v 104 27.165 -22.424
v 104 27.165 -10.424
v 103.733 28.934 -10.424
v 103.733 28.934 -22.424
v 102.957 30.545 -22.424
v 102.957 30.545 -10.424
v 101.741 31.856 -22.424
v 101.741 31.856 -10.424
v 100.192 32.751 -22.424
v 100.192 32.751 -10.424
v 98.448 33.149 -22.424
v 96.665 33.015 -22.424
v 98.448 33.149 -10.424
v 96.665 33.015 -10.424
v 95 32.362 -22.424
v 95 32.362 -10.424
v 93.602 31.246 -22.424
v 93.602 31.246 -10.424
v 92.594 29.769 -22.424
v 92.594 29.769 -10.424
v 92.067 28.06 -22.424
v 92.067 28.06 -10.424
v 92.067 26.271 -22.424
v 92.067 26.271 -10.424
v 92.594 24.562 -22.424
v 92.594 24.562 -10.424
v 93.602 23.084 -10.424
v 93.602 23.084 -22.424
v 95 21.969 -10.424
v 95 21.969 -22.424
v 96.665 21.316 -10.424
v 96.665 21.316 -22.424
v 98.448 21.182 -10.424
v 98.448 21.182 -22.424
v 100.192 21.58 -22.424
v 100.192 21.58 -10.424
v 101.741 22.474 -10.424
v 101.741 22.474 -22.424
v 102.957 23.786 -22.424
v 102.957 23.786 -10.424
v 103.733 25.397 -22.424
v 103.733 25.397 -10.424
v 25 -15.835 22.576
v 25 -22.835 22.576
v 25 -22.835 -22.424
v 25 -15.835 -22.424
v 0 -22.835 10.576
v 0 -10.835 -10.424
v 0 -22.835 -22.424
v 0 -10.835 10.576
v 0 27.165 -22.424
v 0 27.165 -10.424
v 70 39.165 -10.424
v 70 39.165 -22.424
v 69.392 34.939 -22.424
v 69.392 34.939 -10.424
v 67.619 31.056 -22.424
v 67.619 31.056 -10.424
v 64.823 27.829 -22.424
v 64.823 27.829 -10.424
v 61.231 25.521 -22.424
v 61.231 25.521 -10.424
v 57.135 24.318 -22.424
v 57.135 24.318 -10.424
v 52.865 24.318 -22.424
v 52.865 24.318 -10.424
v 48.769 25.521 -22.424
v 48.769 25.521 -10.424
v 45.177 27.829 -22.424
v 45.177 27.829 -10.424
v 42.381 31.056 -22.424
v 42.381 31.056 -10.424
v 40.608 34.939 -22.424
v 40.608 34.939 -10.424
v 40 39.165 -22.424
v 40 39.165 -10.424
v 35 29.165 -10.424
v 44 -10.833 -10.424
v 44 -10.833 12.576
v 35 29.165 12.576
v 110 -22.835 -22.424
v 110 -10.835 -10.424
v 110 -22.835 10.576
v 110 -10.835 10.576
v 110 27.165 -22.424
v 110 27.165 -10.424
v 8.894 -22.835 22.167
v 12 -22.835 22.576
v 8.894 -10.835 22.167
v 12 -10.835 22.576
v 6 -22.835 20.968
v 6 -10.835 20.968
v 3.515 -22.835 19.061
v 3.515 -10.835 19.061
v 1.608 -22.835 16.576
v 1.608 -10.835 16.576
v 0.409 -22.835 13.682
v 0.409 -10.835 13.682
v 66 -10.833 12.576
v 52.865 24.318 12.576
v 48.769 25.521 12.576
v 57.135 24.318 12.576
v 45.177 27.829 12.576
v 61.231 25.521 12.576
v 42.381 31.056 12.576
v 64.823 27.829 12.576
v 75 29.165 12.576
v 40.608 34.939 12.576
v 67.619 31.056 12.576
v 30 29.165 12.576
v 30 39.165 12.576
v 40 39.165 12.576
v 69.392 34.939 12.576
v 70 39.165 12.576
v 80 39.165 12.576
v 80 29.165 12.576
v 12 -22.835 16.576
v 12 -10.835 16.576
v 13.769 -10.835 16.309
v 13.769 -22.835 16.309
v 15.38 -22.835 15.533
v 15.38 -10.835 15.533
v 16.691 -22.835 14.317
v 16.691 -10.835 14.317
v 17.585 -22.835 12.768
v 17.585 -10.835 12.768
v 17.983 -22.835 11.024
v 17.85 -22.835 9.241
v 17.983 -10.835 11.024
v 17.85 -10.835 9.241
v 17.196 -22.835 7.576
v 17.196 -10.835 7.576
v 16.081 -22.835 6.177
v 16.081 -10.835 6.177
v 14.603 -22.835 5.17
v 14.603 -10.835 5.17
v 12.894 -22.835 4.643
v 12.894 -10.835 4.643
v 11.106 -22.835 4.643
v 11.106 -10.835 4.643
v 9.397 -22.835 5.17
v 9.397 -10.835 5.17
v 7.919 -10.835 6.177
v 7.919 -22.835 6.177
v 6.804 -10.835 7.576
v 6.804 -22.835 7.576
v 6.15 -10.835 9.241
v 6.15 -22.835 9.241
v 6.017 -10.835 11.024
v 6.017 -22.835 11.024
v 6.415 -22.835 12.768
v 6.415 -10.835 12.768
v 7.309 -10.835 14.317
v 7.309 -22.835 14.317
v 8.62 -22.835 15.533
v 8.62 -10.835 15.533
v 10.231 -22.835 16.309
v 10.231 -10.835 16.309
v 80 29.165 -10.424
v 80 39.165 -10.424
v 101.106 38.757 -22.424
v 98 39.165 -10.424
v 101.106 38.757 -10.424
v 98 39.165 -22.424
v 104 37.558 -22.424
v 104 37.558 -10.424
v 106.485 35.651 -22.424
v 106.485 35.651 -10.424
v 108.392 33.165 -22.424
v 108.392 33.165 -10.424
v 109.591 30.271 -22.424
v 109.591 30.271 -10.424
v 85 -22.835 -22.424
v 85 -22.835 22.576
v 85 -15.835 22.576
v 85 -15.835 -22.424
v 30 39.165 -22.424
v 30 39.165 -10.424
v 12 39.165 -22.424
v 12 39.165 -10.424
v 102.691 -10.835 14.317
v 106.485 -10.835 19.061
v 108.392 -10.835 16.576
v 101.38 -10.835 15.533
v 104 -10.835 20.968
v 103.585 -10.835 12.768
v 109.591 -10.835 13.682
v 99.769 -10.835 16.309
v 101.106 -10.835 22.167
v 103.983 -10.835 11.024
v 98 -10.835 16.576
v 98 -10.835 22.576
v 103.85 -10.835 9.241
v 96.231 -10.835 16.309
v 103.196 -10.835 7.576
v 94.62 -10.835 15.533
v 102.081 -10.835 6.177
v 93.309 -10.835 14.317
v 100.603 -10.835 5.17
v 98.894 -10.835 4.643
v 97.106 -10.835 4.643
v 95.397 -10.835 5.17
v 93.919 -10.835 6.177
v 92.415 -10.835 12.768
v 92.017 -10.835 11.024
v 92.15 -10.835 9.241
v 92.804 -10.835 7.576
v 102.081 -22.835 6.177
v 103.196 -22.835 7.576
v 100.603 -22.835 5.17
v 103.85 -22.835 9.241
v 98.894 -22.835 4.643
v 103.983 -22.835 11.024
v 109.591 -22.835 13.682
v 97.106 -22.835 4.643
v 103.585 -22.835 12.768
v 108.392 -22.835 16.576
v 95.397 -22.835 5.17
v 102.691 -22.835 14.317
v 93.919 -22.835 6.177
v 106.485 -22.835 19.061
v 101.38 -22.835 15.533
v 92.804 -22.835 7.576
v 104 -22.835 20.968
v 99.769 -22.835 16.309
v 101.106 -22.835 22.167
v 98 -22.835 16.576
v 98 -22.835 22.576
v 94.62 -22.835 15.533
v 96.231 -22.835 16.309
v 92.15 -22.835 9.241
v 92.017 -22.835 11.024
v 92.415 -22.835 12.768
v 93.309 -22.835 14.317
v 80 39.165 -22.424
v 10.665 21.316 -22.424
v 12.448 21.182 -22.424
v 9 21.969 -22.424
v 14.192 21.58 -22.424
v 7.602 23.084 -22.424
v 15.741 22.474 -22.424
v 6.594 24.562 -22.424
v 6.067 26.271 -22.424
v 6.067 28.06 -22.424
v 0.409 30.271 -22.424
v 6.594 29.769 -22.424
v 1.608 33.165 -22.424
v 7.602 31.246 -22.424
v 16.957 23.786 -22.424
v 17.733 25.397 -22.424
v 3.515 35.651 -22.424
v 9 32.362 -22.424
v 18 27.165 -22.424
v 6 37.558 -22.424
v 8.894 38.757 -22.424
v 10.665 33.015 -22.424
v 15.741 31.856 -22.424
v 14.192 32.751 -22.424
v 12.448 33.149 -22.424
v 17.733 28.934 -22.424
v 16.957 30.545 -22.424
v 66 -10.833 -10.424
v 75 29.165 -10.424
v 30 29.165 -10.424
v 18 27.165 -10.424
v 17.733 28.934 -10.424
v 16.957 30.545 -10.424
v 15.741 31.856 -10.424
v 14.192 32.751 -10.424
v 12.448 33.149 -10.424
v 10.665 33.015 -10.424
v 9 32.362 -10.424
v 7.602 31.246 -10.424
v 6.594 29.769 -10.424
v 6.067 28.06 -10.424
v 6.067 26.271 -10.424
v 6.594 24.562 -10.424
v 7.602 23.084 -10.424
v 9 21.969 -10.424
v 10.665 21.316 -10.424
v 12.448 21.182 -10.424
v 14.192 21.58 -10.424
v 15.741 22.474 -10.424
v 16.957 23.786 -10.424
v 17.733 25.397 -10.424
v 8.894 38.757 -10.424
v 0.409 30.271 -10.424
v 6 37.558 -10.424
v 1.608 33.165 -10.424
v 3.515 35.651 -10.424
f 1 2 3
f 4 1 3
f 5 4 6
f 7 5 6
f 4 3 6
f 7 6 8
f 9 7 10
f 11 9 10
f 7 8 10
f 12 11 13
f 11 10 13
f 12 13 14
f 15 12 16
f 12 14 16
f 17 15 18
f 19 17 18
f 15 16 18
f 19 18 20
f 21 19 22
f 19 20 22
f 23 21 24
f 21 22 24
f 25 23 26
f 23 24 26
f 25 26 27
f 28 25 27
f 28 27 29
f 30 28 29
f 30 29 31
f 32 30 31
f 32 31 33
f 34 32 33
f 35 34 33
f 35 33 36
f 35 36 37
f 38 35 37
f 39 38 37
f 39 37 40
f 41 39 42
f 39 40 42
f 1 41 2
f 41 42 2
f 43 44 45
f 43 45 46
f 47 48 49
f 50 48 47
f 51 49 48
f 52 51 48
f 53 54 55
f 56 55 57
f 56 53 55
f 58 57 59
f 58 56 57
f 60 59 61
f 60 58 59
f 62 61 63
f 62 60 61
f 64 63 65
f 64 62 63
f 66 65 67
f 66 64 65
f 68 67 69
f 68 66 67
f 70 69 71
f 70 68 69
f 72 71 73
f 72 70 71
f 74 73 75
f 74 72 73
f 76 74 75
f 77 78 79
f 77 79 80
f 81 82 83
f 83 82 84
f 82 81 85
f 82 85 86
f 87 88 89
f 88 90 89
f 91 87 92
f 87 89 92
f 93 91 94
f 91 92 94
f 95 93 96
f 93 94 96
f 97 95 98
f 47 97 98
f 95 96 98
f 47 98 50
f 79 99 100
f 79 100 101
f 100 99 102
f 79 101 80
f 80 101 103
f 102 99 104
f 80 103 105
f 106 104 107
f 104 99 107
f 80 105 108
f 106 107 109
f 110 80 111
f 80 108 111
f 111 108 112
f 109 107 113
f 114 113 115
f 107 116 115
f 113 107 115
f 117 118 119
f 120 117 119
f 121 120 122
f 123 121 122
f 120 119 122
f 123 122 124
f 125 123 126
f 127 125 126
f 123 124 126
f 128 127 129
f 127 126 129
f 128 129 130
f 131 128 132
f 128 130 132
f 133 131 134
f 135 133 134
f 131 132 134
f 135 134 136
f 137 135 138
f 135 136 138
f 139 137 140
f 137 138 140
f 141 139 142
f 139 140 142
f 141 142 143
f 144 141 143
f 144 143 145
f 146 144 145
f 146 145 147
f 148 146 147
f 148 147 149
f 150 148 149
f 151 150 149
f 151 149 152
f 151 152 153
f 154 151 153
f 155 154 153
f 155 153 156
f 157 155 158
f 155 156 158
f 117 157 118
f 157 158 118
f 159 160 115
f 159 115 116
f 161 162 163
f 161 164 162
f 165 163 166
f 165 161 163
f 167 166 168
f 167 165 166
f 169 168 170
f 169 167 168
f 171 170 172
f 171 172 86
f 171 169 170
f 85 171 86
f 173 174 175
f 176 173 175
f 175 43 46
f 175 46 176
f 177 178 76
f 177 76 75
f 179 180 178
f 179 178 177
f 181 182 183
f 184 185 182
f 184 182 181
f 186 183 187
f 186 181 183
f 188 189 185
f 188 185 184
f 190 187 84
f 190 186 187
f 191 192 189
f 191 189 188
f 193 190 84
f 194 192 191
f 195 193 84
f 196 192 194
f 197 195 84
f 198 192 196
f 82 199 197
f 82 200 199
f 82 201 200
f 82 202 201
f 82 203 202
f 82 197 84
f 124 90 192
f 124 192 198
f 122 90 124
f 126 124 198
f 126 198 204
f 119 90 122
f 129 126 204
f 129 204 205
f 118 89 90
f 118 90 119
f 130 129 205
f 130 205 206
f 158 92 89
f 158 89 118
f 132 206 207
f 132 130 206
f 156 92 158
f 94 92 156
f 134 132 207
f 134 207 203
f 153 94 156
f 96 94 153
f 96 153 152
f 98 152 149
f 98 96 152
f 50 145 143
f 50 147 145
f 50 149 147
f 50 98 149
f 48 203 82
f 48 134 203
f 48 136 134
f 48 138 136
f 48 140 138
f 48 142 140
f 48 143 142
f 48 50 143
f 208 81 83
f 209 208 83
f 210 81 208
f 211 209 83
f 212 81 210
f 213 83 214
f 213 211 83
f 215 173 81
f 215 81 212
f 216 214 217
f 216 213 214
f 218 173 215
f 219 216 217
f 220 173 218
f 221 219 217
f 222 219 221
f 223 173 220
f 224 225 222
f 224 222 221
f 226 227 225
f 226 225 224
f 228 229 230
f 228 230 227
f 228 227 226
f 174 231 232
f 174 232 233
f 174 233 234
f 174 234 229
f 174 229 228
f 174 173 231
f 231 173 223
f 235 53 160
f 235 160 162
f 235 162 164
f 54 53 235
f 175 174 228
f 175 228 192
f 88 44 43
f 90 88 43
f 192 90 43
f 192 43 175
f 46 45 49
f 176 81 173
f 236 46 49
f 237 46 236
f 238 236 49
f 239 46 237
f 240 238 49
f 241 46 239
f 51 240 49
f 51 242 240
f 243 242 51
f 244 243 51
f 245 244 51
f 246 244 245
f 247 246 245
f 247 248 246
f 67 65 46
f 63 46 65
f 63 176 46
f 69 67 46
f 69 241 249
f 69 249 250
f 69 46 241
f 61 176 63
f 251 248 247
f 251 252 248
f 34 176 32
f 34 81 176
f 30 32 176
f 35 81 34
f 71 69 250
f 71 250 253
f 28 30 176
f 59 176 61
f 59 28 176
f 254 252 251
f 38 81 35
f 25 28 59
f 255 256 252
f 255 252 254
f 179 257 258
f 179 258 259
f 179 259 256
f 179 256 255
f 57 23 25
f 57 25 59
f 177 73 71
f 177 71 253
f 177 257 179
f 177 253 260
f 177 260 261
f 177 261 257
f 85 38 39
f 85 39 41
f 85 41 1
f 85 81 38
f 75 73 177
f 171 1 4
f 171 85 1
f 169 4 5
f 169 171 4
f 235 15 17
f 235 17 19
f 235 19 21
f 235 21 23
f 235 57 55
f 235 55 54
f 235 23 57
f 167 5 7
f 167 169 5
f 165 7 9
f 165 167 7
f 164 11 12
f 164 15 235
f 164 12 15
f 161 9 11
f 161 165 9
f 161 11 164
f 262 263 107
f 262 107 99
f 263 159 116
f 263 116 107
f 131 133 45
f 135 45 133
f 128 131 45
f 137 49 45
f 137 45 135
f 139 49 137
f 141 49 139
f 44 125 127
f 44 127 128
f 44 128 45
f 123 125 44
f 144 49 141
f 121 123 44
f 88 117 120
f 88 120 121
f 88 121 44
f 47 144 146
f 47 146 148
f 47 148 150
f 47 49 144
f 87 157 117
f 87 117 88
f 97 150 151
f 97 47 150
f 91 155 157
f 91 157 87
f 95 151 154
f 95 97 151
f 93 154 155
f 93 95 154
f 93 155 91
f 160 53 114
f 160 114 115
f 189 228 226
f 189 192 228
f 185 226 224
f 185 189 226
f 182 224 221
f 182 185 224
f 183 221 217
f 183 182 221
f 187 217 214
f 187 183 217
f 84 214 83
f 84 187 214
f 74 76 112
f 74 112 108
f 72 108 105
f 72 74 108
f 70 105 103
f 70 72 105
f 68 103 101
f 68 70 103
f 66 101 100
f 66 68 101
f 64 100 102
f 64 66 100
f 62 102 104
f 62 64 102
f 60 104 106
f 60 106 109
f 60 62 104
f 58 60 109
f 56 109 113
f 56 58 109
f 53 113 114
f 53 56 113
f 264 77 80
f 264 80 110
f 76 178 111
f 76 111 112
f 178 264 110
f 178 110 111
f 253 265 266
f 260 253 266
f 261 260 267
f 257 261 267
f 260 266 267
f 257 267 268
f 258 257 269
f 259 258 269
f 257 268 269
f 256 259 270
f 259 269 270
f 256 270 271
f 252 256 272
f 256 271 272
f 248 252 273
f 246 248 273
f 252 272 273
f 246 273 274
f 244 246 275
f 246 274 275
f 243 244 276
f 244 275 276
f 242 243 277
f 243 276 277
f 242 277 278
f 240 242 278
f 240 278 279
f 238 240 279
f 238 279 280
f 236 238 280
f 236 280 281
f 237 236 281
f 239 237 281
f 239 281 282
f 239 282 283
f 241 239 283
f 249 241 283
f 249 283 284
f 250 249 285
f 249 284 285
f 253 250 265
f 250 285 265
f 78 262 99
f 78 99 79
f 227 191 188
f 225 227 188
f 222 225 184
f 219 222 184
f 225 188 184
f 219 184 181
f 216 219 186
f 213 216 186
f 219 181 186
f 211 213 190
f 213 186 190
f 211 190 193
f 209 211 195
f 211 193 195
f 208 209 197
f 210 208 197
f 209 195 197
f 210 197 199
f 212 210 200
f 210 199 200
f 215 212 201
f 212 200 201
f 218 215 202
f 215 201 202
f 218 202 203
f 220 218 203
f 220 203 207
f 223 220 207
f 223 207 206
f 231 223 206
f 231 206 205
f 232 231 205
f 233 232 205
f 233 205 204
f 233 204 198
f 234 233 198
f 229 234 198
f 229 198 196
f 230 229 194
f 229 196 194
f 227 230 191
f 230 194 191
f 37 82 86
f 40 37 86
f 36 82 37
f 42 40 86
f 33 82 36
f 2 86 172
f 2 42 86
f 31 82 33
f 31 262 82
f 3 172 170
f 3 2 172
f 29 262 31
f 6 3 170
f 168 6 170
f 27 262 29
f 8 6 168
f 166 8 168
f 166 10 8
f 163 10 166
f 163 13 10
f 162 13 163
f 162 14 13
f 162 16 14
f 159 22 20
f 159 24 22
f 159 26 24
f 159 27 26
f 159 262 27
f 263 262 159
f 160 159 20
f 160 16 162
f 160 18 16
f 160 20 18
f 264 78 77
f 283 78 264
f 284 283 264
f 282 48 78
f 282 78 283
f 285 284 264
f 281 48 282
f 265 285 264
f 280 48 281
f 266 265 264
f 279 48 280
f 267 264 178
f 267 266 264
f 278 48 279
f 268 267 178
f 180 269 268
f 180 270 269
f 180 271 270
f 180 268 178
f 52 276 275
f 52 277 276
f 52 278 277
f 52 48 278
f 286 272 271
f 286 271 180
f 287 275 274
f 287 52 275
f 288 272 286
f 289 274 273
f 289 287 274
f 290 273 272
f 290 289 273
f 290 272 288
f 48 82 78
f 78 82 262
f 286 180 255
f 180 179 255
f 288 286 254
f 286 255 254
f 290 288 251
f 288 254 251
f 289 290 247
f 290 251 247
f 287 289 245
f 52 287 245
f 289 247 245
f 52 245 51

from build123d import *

# Parameters (mm, degrees)
BOSS_EXTRUDE1_DEPTH = 110
FILLET1_R           = 12
SKETCH2_R           = 6
CUT_EXTRUDE1_DEPTH  = 12
SKETCH3_R           = 6
CUT_EXTRUDE3_DEPTH  = 12
SKETCH4_W           = 60
SKETCH4_H           = 7
CUT_EXTRUDE4_DEPTH  = 60
BOSS_EXTRUDE2_DEPTH = 35
CUT_EXTRUDE5_DEPTH  = 35


with BuildPart() as part:
    # Sketch1 → Boss-Extrude1 (new body)
    with BuildSketch(Plane(origin=(0, 0, 0), x_dir=(0, 0, -1), z_dir=(1, 0, 0))):
        Polygon((10.424266139, 39.165457063), (22.424266139, 39.165457063), (22.424266139, -22.834542937), (-22.575733861, -22.834542937), (-22.575733861, -10.834542937), (10.424266139, -10.834542937), align=None)
    extrude(amount=BOSS_EXTRUDE1_DEPTH)

    # Fillet1
    fillet1_edges = [part.edges().sort_by_distance(p)[0] for p in [
        (110, -16.834542937, 22.575733861),
        (0, -16.834542937, 22.575733861),
        (110, 39.165457063, -16.424266139),
        (0, 39.165457063, -16.424266139),
    ]]
    fillet(fillet1_edges, radius=FILLET1_R)

    # Sketch2 → Cut-Extrude1 (cut)
    with BuildSketch(Plane(origin=(0, -10.834542937, 0), x_dir=(1, 0, 0), z_dir=(0, 1, 0))):
        with Locations(Location((12, -10.575733861, 0), (0, 0, 270))):
            Circle(SKETCH2_R)
        with Locations(Location((98, -10.575733861, 0), (0, 0, 270))):
            Circle(SKETCH2_R)
    extrude(amount=-CUT_EXTRUDE1_DEPTH, mode=Mode.SUBTRACT)

    # Sketch3 → Cut-Extrude3 (cut)
    with BuildSketch(Plane.XY.offset(-10.424266139)):
        with Locations((12, 27.165457063)):
            Circle(SKETCH3_R)
        with Locations((98, 27.165457063)):
            Circle(SKETCH3_R)
    extrude(amount=-CUT_EXTRUDE3_DEPTH, mode=Mode.SUBTRACT)

    # Sketch4 → Cut-Extrude4 (cut)
    with BuildSketch(Plane.XY.offset(22.575733861)):
        with Locations((55, -19.334542937)):
            Rectangle(SKETCH4_W, SKETCH4_H)
    extrude(amount=-CUT_EXTRUDE4_DEPTH, mode=Mode.SUBTRACT)

    # 3DSketch1 → Boss-Extrude2 (add)
    with BuildSketch(Plane(origin=(30, 39.165457063, -22.424266139), x_dir=(0.5843189672224485, -0.8115240874700463, 0), z_dir=(0, 0, 1))):
        with BuildLine():
            Line((0, 0), (5.843189672, 8.115240875))
            ThreePointArc((5.843189672, 8.115240875), (26.780835493, 11.523317678), (23.372758689, 32.460963499))
            Line((23.372758689, 32.460963499), (29.215948361, 40.576204374))
            Line((29.215948361, 40.576204374), (37.331189236, 34.733014701))
            Line((37.331189236, 34.733014701), (34.4095944, 30.675394264))
            Line((34.4095944, 30.675394264), (61.610185565, 0))
            Line((61.610185565, 0), (48.755168287, -17.853529924))
            Line((48.755168287, -17.853529924), (11.036835711, -1.785569235))
            Line((11.036835711, -1.785569235), (8.115240875, -5.843189672))
            Line((8.115240875, -5.843189672), (0, 0))
        make_face()
    extrude(amount=BOSS_EXTRUDE2_DEPTH)

    # Sketch5 → Cut-Extrude5 (cut)
    with BuildSketch(Plane.XY.offset(-10.424266139)):
        with BuildLine():
            Line((40, 39.165457063), (70, 39.165457063))
            ThreePointArc((70, 39.165457063), (55, 24.165457063), (40, 39.165457063))
        make_face()
    extrude(amount=-CUT_EXTRUDE5_DEPTH, mode=Mode.SUBTRACT)


solid = part.part
